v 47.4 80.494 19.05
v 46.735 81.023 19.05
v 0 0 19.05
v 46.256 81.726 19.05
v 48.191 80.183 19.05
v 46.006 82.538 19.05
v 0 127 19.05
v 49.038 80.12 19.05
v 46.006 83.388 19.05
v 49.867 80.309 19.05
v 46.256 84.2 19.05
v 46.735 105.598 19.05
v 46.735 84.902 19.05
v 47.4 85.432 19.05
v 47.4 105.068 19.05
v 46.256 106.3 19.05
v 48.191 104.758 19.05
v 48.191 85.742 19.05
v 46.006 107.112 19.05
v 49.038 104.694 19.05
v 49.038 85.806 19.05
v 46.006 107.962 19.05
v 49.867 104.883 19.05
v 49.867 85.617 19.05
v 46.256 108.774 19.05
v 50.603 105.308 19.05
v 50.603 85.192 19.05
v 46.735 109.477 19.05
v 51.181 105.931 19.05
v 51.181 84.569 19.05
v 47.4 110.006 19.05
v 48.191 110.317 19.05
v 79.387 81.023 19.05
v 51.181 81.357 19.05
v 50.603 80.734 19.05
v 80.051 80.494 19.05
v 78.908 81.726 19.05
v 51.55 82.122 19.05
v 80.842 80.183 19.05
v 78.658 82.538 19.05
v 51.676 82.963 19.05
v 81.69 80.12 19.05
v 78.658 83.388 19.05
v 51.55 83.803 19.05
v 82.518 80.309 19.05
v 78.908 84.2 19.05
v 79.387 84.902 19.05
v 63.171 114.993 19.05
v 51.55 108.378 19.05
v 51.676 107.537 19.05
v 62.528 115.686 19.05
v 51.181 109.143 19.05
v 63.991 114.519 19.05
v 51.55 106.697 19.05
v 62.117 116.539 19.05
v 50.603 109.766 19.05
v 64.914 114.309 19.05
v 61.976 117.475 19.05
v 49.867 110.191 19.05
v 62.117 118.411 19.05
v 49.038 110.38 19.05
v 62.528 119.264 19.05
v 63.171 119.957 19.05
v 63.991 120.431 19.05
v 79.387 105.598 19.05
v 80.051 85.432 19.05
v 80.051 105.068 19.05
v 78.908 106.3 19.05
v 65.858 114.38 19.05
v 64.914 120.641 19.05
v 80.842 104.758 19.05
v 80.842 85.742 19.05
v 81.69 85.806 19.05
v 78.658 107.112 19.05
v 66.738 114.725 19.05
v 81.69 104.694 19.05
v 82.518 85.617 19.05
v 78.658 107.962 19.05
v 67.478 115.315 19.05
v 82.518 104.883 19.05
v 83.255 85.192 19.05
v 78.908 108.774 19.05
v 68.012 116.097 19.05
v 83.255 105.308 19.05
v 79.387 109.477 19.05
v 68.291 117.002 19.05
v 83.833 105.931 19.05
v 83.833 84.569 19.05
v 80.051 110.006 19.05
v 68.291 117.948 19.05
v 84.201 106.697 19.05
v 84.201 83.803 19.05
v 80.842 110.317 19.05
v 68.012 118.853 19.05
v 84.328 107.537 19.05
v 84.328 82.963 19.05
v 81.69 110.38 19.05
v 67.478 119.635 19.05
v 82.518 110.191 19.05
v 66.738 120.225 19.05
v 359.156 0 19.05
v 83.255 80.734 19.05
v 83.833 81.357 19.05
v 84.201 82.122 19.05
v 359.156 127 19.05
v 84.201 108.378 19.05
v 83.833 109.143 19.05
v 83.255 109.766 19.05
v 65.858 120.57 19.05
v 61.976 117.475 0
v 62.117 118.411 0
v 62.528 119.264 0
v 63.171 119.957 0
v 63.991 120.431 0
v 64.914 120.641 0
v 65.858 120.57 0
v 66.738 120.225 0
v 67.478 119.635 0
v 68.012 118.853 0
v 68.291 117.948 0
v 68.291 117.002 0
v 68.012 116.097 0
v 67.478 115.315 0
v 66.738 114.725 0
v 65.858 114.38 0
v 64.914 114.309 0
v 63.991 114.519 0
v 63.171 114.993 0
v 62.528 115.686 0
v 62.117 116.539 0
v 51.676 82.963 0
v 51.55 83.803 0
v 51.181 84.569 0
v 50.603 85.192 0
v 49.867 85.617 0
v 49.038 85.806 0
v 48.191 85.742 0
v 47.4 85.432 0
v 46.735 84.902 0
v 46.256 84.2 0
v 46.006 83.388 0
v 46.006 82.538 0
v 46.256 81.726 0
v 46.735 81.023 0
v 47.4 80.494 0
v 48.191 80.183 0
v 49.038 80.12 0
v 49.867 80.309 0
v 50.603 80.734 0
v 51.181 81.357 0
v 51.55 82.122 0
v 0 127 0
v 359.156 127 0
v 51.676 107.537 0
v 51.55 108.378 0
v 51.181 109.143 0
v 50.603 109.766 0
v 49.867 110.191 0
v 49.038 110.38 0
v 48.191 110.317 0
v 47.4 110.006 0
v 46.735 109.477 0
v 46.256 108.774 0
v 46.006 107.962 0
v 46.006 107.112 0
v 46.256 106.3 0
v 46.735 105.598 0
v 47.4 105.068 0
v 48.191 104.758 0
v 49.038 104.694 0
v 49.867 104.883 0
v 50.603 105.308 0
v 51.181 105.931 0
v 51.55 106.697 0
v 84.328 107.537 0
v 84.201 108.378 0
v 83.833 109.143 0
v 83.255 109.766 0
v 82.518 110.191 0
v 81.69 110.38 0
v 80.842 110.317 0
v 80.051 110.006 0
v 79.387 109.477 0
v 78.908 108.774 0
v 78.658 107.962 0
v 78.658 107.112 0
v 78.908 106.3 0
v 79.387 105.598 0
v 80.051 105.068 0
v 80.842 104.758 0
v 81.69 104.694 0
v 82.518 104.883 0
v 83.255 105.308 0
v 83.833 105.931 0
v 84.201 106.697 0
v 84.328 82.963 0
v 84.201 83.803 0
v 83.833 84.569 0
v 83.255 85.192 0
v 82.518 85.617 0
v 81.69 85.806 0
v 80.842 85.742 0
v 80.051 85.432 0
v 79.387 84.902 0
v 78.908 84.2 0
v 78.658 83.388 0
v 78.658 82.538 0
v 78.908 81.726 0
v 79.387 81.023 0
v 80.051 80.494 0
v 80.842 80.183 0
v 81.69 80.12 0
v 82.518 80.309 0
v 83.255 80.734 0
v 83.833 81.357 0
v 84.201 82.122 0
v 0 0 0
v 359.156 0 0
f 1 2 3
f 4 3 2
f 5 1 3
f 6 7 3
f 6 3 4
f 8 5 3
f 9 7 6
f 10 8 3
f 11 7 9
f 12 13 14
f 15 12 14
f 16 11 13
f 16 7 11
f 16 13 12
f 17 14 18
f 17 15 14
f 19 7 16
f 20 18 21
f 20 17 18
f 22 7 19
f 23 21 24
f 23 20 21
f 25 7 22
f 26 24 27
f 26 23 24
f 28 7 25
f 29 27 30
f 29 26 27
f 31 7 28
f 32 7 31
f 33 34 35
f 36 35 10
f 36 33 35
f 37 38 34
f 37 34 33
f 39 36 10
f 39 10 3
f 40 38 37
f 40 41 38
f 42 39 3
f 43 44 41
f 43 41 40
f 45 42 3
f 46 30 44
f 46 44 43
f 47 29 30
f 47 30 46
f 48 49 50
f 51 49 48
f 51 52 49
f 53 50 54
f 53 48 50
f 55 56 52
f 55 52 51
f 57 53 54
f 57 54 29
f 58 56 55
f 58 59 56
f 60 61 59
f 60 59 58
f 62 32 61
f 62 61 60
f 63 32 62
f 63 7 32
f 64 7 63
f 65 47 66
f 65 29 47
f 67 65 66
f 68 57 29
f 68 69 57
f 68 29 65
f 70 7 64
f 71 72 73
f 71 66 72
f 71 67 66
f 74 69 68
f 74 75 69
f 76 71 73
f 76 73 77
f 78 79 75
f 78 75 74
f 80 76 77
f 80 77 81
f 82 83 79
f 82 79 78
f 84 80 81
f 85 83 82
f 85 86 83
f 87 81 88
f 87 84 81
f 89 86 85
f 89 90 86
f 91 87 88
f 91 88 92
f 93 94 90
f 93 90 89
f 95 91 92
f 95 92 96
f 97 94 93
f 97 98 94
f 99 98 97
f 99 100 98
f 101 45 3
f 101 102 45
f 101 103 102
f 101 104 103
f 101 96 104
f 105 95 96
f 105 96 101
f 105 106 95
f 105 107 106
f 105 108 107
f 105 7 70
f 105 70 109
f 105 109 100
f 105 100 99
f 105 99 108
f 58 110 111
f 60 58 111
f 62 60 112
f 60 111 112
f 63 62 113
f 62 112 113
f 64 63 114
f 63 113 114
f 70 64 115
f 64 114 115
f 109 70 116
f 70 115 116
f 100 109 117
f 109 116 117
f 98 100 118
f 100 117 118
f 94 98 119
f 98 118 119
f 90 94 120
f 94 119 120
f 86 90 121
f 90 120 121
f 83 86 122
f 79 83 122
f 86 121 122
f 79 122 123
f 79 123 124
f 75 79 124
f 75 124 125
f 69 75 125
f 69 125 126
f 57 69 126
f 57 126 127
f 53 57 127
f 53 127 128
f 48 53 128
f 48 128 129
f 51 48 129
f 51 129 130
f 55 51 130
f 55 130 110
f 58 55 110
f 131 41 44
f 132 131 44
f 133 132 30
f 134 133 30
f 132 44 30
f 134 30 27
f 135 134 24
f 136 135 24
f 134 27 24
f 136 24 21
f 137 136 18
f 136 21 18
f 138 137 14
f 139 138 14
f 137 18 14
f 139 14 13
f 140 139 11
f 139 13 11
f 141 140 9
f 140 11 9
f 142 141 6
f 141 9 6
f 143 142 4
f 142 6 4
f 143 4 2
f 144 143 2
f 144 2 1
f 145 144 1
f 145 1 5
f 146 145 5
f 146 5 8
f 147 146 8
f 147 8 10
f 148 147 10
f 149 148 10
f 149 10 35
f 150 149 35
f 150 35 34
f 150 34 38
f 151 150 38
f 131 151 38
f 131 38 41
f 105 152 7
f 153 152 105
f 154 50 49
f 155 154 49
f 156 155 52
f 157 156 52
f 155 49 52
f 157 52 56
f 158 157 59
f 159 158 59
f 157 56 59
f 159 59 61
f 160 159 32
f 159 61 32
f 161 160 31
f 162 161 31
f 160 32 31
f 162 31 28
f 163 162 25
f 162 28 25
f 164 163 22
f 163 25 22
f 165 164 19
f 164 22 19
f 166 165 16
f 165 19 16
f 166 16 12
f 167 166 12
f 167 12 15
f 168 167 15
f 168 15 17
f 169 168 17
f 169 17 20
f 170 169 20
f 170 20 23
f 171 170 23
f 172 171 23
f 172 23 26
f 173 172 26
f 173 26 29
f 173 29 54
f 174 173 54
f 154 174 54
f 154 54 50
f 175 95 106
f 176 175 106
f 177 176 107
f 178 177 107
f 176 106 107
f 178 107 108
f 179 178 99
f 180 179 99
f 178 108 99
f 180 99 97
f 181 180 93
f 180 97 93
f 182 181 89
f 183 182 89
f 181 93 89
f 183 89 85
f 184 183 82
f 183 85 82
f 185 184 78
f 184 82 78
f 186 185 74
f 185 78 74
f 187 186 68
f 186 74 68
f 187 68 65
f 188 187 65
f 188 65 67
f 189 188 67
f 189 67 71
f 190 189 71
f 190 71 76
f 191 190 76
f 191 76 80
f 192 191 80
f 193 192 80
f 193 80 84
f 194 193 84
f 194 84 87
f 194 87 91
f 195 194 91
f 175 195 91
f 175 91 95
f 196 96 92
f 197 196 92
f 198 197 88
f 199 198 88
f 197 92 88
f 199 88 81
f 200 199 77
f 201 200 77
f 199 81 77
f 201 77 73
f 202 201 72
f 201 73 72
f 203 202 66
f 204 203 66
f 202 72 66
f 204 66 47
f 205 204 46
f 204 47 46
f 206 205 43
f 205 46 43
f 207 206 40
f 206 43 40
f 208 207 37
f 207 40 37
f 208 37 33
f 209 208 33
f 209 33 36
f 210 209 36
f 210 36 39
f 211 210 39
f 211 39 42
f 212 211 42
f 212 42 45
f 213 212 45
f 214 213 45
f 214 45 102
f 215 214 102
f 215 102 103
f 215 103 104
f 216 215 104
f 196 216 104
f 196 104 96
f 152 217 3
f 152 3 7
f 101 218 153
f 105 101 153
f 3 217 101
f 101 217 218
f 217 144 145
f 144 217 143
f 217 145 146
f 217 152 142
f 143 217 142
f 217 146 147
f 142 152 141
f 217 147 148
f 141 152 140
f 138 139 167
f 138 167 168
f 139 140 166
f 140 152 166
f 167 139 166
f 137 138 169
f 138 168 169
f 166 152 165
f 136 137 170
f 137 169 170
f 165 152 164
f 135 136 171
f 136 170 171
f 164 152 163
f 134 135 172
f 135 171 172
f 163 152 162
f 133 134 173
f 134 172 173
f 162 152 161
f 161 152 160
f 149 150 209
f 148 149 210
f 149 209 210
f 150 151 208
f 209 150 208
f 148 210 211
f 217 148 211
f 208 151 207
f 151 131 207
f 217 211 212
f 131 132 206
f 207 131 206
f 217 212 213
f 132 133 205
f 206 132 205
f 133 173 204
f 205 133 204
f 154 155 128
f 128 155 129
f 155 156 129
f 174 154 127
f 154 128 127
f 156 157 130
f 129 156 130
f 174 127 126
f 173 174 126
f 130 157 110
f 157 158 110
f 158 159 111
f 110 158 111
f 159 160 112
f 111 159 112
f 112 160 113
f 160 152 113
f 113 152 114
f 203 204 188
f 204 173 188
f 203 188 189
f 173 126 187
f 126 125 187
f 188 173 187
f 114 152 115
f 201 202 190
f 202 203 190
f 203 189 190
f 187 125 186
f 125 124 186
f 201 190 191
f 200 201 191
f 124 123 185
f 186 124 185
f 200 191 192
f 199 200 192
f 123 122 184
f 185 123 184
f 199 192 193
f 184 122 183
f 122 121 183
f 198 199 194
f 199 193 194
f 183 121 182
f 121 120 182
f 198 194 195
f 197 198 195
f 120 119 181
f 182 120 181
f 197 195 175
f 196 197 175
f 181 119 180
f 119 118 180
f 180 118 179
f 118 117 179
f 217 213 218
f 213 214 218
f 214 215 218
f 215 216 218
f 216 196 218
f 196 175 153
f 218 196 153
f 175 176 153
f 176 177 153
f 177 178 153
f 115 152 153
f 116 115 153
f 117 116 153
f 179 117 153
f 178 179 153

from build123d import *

# Parameters (mm, degrees)
SKETCH1_W           = 359.156
SKETCH1_H           = 127
BOSS_EXTRUDE1_DEPTH = 19.05
CUT_EXTRUDE1_REACH  = 21.05
SKETCH2_R           = 2.85115
CUT_EXTRUDE2_REACH  = 21.05
SKETCH3_R           = 3.175


with BuildPart() as part:
    # Sketch1 → Boss-Extrude1 (new body)
    with BuildSketch(Plane.XY):
        with Locations((179.578, 63.5)):
            Rectangle(SKETCH1_W, SKETCH1_H)
    extrude(amount=BOSS_EXTRUDE1_DEPTH)

    # Sketch2 → Cut-Extrude1 (cut, up to next)
    with BuildSketch(Plane.XY.offset(19.05), mode=Mode.PRIVATE) as cut_extrude1_sk1:
        with Locations((48.82515, 82.96275)):
            Circle(SKETCH2_R)
    cut_extrude1_tool1 = extrude(cut_extrude1_sk1.sketch, amount=-CUT_EXTRUDE1_REACH, mode=Mode.PRIVATE) & part.part
    add(cut_extrude1_tool1.solids().sort_by_distance((48.82515, 82.96275, 19.05))[0], mode=Mode.SUBTRACT)
    # Sketch2 → Cut-Extrude1 (cut, up to next)
    with BuildSketch(Plane.XY.offset(19.05), mode=Mode.PRIVATE) as cut_extrude1_sk2:
        with Locations((48.82515, 107.53725)):
            Circle(SKETCH2_R)
    cut_extrude1_tool2 = extrude(cut_extrude1_sk2.sketch, amount=-CUT_EXTRUDE1_REACH, mode=Mode.PRIVATE) & part.part
    add(cut_extrude1_tool2.solids().sort_by_distance((48.82515, 107.53725, 19.05))[0], mode=Mode.SUBTRACT)
    # Sketch2 → Cut-Extrude1 (cut, up to next)
    with BuildSketch(Plane.XY.offset(19.05), mode=Mode.PRIVATE) as cut_extrude1_sk3:
        with Locations((81.47685, 107.53725)):
            Circle(SKETCH2_R)
    cut_extrude1_tool3 = extrude(cut_extrude1_sk3.sketch, amount=-CUT_EXTRUDE1_REACH, mode=Mode.PRIVATE) & part.part
    add(cut_extrude1_tool3.solids().sort_by_distance((81.47685, 107.53725, 19.05))[0], mode=Mode.SUBTRACT)
    # Sketch2 → Cut-Extrude1 (cut, up to next)
    with BuildSketch(Plane.XY.offset(19.05), mode=Mode.PRIVATE) as cut_extrude1_sk4:
        with Locations((81.47685, 82.96275)):
            Circle(SKETCH2_R)
    cut_extrude1_tool4 = extrude(cut_extrude1_sk4.sketch, amount=-CUT_EXTRUDE1_REACH, mode=Mode.PRIVATE) & part.part
    add(cut_extrude1_tool4.solids().sort_by_distance((81.47685, 82.96275, 19.05))[0], mode=Mode.SUBTRACT)

    # Sketch3 → Cut-Extrude2 (cut, up to next)
    with BuildSketch(Plane(origin=(0, 0, 0), x_dir=(-1, 0, 0), z_dir=(0, 0, -1)), mode=Mode.PRIVATE) as cut_extrude2_sk1:
        with Locations((-65.151, 117.475)):
            Circle(SKETCH3_R)
    cut_extrude2_tool1 = extrude(cut_extrude2_sk1.sketch, amount=-CUT_EXTRUDE2_REACH, mode=Mode.PRIVATE) & part.part
    add(cut_extrude2_tool1.solids().sort_by_distance((65.151, 117.475, 0))[0], mode=Mode.SUBTRACT)


solid = part.part
